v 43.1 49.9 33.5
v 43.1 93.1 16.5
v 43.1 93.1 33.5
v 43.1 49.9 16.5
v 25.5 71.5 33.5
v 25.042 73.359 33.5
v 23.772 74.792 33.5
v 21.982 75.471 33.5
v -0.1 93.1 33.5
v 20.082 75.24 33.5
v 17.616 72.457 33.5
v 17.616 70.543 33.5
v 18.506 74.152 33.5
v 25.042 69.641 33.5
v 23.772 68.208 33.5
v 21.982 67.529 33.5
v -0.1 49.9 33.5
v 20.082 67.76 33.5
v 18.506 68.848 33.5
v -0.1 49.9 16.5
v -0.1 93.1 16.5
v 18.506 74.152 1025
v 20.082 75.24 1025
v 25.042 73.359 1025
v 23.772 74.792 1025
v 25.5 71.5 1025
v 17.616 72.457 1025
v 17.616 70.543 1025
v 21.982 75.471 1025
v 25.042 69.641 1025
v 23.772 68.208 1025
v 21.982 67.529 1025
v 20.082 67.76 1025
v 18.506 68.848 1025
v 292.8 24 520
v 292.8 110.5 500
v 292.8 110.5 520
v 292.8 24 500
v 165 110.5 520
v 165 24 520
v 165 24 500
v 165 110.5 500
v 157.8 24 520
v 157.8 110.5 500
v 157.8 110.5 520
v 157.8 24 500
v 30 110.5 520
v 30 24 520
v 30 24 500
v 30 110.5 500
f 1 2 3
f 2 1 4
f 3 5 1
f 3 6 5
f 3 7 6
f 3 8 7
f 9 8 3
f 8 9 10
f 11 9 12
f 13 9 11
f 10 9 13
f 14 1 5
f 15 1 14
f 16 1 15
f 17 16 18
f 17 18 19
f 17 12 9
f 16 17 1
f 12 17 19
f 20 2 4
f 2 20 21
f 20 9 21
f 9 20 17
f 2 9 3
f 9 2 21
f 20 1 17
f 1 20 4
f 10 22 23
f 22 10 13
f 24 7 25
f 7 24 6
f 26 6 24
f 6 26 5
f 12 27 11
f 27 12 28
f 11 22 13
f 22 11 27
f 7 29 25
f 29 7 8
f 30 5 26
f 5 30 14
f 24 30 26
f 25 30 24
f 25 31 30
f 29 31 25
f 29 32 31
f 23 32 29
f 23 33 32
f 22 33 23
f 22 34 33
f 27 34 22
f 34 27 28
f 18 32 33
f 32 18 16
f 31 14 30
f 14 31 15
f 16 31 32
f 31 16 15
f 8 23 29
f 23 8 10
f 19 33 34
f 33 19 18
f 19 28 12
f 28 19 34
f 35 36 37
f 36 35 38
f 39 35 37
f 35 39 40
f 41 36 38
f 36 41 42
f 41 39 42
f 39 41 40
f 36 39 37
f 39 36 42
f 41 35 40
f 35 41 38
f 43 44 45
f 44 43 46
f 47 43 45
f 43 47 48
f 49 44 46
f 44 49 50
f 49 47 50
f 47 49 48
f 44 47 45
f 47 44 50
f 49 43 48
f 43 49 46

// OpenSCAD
widthinside=120;
lengthbottom=300;
semiheight=900;
fullheight=1000;
beamwidth=15;
partdistance=165;
microplatex=165;
microplatex2=30;
microplatey=24;
microplatez=500;

module linearBearing(){
    
}

module motorAndShaft(){
    cube([43.2,43.2,17],center=true);
    cylinder(1000,4,4);
}


module microplate(){
    width=86.5;
    length=127.8;
    height=20;
    cube([length,width,height]);
}
module beam(length,dir="z"){
    if(dir=="z")
translate([7.5,7.5,0])linear_extrude(height=length)import("openbeam.dxf");
      if(dir=="x")
translate([0,7.5,7.5])rotate([0,90,0])linear_extrude(height=length)import("openbeam.dxf");
      if(dir=="y")
translate([7.5,0,7.5])rotate([-90,0,0])linear_extrude(height=length)
import("openbeam.dxf");
}


beam(lengthbottom,"x");

translate([0,0,beamwidth])beam(fullheight,"z");

translate([0,widthinside,beamwidth])beam(fullheight,"z");
translate([beamwidth+partdistance,0,beamwidth])beam(fullheight,"z");

translate([beamwidth+partdistance,widthinside,beamwidth])beam(fullheight,"z");

translate([lengthbottom-beamwidth,0,beamwidth])beam(semiheight,"z");
translate([lengthbottom-beamwidth,widthinside,beamwidth])beam(semiheight,"z");
translate([0,widthinside,0])beam(lengthbottom,"x");
translate([0,beamwidth,0])beam(widthinside,"y");
translate([lengthbottom-beamwidth,beamwidth,0])beam(widthinside,"y");
translate([microplatex,microplatey,microplatez])color("red") microplate();
translate([microplatex2,microplatey,microplatez])color("green") microplate();

translate([43/2,50+43/2,beamwidth+10])color("blue") motorAndShaft();
